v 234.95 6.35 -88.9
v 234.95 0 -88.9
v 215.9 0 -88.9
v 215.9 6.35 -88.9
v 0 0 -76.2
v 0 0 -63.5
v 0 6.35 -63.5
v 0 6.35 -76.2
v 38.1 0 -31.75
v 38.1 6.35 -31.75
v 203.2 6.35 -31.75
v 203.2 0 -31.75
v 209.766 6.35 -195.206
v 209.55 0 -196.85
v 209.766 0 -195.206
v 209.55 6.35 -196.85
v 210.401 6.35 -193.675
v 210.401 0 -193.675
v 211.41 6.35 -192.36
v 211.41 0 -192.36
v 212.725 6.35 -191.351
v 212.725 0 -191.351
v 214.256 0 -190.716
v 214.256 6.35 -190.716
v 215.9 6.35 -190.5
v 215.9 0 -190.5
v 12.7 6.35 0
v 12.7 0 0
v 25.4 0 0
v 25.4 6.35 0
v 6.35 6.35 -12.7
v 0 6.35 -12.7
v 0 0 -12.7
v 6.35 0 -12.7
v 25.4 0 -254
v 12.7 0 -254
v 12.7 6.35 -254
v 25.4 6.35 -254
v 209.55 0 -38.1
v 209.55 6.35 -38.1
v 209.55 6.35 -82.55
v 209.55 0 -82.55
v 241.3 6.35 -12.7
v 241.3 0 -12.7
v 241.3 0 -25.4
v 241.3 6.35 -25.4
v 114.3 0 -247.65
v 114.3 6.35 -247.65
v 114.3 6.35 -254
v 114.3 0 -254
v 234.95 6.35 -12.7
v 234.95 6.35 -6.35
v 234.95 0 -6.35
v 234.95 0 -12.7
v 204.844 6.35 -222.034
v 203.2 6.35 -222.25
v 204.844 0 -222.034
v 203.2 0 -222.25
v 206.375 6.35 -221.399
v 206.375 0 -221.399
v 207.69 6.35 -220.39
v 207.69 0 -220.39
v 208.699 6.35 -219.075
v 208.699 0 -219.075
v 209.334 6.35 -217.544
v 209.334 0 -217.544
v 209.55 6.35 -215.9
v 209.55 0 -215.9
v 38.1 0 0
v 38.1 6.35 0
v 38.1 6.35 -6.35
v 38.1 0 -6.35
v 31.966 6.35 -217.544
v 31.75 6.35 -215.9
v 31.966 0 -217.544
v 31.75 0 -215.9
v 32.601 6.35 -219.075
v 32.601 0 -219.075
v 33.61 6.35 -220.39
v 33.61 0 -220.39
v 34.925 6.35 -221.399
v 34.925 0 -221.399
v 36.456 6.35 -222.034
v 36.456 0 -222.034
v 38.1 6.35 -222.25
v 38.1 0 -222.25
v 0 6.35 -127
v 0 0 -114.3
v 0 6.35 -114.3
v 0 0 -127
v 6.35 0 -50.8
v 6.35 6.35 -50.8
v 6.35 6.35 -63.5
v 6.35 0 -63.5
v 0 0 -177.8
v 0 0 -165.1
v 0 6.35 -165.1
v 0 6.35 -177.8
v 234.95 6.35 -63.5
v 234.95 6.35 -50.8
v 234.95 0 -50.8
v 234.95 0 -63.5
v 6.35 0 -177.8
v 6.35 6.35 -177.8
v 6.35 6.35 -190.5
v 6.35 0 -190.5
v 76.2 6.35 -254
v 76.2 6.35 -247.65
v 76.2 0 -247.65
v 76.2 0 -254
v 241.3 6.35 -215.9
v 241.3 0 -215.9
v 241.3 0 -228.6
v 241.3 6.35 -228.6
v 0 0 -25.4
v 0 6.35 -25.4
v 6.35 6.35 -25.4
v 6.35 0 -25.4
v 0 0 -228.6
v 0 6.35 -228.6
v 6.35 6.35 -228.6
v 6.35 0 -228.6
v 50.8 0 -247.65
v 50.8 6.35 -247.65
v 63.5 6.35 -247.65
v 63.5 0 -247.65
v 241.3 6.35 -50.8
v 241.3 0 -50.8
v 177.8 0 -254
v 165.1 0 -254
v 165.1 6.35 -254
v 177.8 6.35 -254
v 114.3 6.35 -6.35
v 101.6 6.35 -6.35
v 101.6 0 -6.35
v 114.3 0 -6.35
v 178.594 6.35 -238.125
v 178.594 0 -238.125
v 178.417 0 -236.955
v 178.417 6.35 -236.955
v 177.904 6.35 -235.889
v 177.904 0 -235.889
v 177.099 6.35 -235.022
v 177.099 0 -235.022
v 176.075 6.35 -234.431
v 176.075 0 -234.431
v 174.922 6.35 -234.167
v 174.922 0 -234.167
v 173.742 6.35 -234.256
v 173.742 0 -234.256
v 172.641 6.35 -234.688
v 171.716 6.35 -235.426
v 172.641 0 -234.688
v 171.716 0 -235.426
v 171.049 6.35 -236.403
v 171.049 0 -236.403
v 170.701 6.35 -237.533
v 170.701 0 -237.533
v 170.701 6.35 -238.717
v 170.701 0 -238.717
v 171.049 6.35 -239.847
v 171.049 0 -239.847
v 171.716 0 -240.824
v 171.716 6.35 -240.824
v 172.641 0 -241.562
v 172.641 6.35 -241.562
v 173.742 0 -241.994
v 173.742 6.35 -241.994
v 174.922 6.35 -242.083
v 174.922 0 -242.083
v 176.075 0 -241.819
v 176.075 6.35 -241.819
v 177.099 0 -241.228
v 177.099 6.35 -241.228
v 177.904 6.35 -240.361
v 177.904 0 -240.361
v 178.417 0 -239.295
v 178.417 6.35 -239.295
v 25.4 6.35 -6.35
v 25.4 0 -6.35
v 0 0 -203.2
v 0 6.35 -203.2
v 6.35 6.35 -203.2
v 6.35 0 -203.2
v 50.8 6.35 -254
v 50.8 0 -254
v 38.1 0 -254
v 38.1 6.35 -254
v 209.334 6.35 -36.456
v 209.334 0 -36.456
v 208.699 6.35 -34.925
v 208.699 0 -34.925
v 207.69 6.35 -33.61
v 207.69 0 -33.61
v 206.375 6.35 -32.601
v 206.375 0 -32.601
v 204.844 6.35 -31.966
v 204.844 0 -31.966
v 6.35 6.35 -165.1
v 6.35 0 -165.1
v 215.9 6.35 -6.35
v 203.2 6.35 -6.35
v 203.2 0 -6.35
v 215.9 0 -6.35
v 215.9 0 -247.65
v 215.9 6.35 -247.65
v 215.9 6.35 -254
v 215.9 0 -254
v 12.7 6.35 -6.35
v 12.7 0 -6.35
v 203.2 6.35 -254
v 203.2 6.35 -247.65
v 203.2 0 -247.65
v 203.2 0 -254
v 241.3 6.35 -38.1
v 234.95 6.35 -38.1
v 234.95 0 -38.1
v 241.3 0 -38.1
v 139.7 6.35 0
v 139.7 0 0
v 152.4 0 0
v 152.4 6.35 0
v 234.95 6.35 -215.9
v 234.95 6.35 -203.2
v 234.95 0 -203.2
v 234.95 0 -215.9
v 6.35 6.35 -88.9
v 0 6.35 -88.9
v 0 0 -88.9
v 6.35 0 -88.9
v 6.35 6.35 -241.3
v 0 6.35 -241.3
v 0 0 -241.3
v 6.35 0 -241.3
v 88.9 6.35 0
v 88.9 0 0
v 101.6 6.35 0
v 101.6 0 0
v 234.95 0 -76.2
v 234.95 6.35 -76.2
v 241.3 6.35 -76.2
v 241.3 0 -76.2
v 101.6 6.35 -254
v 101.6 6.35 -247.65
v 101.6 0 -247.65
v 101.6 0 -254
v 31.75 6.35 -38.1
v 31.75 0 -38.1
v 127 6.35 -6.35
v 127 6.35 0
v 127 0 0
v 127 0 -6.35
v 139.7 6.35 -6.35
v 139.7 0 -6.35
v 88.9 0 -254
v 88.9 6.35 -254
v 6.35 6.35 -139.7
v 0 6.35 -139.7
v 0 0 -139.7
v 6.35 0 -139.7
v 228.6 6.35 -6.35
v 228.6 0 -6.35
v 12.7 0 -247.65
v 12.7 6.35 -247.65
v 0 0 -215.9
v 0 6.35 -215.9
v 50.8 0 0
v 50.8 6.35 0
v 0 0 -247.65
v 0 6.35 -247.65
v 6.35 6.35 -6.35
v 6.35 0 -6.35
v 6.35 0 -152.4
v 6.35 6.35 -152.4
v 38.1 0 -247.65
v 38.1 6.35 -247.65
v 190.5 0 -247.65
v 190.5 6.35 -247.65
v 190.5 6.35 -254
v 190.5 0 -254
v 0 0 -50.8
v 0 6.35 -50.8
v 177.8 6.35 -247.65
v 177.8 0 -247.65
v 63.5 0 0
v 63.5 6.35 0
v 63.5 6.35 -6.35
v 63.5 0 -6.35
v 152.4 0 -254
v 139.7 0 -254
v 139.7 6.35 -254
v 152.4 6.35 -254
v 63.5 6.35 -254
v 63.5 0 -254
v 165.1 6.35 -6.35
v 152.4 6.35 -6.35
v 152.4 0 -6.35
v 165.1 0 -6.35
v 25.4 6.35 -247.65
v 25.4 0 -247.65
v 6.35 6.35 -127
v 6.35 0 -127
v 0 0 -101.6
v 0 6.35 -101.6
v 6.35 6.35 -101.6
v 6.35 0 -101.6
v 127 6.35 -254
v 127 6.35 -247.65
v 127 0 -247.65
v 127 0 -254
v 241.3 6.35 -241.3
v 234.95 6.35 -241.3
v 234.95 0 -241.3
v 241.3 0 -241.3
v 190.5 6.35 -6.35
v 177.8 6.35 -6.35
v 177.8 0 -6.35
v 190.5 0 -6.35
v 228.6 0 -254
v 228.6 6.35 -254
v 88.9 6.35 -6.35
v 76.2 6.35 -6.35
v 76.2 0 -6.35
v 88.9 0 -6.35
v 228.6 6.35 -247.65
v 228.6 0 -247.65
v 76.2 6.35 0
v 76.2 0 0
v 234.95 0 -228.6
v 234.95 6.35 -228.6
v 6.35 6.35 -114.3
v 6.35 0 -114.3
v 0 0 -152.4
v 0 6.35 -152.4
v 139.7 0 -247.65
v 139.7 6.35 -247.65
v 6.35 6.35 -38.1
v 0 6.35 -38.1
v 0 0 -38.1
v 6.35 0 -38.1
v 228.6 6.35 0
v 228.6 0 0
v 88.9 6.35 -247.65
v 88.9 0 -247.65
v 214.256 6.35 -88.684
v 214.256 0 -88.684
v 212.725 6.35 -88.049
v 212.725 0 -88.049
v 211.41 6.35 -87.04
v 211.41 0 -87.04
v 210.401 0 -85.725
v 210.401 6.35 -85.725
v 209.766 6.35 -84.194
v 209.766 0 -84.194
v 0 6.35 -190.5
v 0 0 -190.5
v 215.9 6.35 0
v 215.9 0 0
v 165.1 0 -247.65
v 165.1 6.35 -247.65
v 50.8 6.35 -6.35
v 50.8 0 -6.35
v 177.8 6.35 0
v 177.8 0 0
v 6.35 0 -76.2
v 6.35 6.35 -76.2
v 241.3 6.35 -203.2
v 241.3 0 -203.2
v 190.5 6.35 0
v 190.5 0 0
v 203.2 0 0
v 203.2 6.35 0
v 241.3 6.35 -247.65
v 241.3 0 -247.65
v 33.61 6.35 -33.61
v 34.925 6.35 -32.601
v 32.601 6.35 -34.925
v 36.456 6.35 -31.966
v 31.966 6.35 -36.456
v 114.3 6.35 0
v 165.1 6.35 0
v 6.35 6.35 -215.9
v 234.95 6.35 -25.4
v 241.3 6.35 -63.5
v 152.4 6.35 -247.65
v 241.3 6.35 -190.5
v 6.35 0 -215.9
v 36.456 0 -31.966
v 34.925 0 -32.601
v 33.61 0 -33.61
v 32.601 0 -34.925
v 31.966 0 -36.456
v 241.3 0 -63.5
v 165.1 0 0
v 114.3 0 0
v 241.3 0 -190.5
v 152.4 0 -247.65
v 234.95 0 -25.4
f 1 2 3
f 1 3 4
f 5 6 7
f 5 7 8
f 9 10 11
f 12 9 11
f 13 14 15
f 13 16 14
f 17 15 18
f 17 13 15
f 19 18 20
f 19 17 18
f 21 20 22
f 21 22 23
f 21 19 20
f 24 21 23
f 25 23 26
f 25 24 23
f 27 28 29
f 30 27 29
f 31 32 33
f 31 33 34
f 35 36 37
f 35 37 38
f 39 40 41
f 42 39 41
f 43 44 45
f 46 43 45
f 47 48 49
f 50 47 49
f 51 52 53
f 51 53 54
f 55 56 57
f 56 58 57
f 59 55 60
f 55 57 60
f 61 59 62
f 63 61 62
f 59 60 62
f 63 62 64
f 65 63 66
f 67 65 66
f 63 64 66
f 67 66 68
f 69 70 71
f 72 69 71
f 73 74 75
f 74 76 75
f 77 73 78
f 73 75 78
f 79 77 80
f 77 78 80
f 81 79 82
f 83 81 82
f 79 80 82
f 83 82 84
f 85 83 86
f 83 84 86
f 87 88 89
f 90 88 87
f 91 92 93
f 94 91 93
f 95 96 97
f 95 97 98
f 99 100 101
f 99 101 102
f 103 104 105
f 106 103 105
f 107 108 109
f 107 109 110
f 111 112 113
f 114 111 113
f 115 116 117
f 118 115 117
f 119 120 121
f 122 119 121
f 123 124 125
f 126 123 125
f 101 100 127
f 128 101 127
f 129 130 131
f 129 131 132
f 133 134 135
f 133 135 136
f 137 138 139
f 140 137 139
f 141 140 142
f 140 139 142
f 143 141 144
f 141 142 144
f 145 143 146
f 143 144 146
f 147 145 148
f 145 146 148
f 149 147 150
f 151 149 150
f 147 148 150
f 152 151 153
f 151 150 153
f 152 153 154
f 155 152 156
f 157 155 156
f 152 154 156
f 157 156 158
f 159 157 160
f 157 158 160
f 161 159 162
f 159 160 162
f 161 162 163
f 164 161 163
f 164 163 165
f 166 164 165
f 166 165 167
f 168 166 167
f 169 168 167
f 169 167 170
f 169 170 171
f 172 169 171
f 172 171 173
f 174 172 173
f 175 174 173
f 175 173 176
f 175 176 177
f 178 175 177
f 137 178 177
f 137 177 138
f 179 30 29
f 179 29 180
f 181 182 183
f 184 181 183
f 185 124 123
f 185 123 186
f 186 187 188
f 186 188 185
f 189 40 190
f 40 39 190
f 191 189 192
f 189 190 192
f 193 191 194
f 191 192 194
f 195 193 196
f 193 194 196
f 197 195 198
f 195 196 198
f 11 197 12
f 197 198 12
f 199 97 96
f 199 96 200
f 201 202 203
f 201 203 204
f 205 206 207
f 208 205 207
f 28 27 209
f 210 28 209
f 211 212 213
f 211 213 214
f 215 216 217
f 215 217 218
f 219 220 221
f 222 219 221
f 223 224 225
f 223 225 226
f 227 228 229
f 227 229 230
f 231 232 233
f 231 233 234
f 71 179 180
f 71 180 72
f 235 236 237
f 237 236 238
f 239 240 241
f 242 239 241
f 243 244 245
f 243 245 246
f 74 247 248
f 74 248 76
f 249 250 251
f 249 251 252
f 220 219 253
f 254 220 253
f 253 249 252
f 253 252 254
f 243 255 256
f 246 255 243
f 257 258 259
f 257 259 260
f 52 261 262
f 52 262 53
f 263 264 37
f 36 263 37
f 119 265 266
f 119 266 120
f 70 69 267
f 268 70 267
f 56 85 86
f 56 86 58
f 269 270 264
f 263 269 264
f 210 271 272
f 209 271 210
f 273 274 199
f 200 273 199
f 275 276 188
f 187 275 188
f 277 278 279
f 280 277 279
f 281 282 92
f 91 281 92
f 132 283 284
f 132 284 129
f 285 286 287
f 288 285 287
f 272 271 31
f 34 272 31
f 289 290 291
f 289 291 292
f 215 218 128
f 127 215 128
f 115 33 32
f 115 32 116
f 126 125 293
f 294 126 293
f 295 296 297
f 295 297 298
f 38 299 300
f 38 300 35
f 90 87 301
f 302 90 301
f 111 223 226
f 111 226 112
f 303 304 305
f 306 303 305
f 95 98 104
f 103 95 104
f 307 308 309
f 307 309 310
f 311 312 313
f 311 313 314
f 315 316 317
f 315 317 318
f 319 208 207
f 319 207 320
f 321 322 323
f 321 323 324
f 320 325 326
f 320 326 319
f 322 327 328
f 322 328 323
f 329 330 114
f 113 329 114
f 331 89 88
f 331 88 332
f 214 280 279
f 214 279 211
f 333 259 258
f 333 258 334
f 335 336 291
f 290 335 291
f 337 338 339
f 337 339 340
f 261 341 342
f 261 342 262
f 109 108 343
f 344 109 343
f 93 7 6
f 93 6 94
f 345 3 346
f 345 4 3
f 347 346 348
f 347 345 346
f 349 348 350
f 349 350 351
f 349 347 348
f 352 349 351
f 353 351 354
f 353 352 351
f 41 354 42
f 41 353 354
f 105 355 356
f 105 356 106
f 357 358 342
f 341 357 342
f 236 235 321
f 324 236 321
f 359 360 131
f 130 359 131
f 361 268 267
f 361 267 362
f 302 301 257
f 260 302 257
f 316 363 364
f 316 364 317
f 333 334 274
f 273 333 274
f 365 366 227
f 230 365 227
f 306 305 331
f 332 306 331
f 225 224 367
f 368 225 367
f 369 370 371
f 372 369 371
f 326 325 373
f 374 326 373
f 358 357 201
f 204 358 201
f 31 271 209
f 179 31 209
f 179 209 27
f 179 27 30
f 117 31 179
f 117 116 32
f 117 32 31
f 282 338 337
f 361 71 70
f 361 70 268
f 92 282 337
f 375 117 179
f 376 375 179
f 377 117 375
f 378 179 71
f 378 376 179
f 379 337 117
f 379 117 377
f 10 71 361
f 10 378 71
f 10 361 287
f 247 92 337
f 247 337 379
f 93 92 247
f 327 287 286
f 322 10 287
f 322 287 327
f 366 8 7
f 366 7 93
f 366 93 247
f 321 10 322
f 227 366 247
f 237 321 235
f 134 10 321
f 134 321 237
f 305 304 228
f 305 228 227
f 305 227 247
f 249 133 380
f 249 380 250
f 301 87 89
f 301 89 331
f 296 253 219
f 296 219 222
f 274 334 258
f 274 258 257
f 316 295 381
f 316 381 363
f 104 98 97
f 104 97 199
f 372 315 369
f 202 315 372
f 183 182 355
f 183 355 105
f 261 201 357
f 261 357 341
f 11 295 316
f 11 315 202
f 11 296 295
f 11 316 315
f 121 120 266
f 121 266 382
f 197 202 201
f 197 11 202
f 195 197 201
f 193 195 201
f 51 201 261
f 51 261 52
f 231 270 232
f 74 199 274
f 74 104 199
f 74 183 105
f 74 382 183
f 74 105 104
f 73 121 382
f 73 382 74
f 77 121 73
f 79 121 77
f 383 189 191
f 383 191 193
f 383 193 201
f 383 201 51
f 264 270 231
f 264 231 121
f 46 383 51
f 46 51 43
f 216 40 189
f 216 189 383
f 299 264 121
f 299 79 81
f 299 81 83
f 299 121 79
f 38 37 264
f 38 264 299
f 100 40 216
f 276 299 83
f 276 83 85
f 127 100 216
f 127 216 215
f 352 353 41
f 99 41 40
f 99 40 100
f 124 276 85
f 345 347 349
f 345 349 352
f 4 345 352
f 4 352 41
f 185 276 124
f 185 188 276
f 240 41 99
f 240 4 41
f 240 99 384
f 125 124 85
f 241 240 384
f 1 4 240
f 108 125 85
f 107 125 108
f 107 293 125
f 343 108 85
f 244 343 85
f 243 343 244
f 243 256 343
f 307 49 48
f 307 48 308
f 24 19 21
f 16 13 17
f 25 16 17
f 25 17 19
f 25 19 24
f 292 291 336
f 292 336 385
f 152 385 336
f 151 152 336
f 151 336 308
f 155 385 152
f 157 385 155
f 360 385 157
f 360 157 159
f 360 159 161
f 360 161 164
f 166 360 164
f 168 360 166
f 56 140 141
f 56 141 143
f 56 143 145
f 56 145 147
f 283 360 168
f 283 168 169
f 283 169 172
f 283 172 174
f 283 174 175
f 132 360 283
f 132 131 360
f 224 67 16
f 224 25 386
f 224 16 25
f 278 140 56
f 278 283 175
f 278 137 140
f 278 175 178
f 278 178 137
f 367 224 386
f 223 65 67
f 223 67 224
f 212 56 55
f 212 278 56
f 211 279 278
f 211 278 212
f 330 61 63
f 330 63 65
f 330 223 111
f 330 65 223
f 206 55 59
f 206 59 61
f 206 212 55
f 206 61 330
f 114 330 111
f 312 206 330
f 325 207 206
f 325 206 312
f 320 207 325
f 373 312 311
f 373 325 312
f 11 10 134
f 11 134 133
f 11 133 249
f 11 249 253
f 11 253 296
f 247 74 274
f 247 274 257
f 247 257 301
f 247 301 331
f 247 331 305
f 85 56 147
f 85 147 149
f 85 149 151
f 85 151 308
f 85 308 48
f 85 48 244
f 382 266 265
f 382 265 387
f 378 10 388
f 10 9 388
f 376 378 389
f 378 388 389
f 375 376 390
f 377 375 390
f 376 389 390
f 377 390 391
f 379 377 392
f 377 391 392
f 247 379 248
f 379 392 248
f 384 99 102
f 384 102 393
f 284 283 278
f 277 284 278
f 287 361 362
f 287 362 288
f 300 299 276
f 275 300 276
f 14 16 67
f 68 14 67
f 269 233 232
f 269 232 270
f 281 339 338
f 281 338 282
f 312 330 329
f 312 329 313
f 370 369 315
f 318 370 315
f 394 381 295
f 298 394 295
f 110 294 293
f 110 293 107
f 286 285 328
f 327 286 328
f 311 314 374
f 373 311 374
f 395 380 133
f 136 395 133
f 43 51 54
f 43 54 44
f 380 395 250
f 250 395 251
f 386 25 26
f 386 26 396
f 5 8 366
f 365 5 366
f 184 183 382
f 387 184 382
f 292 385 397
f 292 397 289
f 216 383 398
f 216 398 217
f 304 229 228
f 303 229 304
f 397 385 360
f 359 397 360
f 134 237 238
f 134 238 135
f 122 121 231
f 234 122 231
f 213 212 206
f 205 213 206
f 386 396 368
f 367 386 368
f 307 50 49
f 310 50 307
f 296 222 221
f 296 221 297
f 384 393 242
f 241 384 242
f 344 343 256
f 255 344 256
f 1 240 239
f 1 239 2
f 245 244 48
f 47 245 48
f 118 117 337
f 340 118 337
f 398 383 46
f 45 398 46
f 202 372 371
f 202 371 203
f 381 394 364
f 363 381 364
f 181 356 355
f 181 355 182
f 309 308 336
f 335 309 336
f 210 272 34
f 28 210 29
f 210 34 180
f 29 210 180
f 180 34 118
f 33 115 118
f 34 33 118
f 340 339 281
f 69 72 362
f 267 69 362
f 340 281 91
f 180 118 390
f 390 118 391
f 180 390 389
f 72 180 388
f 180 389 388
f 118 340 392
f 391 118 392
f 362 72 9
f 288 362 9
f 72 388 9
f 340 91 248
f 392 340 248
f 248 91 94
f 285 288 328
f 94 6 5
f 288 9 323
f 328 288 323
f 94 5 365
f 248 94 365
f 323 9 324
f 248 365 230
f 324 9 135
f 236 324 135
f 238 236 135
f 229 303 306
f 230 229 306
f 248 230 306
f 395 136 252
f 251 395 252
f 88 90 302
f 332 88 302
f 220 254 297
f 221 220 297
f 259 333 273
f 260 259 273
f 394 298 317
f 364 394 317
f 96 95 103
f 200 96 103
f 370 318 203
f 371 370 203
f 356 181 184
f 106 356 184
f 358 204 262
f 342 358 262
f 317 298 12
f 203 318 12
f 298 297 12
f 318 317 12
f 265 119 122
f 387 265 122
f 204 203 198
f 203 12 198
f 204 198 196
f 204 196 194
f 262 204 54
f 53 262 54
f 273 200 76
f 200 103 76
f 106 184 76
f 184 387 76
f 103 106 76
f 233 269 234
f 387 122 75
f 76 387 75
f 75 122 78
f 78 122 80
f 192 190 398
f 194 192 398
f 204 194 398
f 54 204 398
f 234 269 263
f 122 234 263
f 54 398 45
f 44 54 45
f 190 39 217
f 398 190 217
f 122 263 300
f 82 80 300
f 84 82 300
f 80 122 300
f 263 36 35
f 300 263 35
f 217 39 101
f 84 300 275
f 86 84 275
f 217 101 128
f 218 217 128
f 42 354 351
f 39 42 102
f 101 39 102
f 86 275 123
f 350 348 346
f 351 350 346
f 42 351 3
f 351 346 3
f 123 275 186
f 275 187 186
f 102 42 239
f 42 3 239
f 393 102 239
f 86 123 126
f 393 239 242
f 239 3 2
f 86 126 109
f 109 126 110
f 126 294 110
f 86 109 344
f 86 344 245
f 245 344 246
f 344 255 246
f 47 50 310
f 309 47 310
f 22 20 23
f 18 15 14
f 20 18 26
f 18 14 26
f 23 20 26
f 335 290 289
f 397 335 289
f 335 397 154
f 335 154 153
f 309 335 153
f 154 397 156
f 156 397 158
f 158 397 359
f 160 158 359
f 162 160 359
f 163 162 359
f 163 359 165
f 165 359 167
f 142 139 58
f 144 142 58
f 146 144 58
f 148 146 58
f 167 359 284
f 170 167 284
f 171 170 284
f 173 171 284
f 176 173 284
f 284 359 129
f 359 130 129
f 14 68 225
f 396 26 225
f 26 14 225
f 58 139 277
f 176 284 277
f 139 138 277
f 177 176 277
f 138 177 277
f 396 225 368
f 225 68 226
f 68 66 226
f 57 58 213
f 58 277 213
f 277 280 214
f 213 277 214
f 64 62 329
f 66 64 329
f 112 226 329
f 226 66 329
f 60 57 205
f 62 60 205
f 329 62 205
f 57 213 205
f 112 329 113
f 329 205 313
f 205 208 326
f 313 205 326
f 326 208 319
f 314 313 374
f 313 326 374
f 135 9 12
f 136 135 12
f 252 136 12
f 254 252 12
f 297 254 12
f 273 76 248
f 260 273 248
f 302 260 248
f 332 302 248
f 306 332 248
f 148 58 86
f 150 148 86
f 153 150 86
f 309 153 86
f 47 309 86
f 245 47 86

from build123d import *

# Parameters (mm, degrees)
SKETCH1_W               = 241.3
SKETCH1_H               = 254
BOSS_EXTRUDE1_DEPTH     = 6.35
SKETCH2_W               = 6.35
SKETCH2_H               = 12.7
CUT_EXTRUDE1_DEPTH      = 7.35
LPATTERN1_COUNT         = 10
LPATTERN1_PITCH         = 25.4
SKETCH3_W               = 12.7
SKETCH3_H               = 6.35
CUT_EXTRUDE2_DEPTH      = 7.35
LPATTERN2_COUNT         = 10
LPATTERN2_PITCH         = 25.4
SKETCH4_W               = 177.8
SKETCH4_H               = 190.5
CUT_EXTRUDE3_DEPTH      = 7.35
SKETCH5_W               = 101.6
SKETCH5_H               = 6.35
CUT_EXTRUDE4_DEPTH      = 7.35
CUT_EXTRUDE4_DEPTH_BACK = 76.2
FILLET1_R               = 6.35
SKETCH6_R               = 3.96875
CUT_EXTRUDE5_DEPTH      = 115.3


with BuildPart() as part:
    # Sketch1 → Boss-Extrude1 (new body)
    with BuildSketch(Plane(origin=(0, 0, 0), x_dir=(1, 0, 0), z_dir=(0, 1, 0))):
        with Locations((120.65, 127)):
            Rectangle(SKETCH1_W, SKETCH1_H)
    extrude(amount=BOSS_EXTRUDE1_DEPTH)

    # Sketch2 → Cut-Extrude1 (cut, through all)
    with BuildSketch(Plane(origin=(0, 6.35, 0), x_dir=(1, 0, 0), z_dir=(0, 1, 0))):
        with Locations((3.175, 6.35)):
            Rectangle(SKETCH2_W, SKETCH2_H)
        with Locations((238.125, 6.35)):
            Rectangle(SKETCH2_W, SKETCH2_H)
    cut_extrude1 = extrude(amount=-CUT_EXTRUDE1_DEPTH, mode=Mode.SUBTRACT)

    # LPattern1: Cut-Extrude1 ×10
    with Locations(*[(0, 0, -i * LPATTERN1_PITCH) for i in range(1, LPATTERN1_COUNT)]):
        add(cut_extrude1, mode=Mode.SUBTRACT)

    # Sketch3 → Cut-Extrude2 (cut, through all)
    with BuildSketch(Plane(origin=(0, 6.35, 0), x_dir=(1, 0, 0), z_dir=(0, 1, 0))):
        with Locations((6.35, 3.175)):
            Rectangle(SKETCH3_W, SKETCH3_H)
        with Locations((6.35, 250.825)):
            Rectangle(SKETCH3_W, SKETCH3_H)
    cut_extrude2 = extrude(amount=-CUT_EXTRUDE2_DEPTH, mode=Mode.SUBTRACT)

    # LPattern2: Cut-Extrude2 ×10
    with Locations(*[(i * LPATTERN2_PITCH, 0, 0) for i in range(1, LPATTERN2_COUNT)]):
        add(cut_extrude2, mode=Mode.SUBTRACT)

    # Sketch4 → Cut-Extrude3 (cut, through all)
    with BuildSketch(Plane(origin=(0, 6.35, 0), x_dir=(1, 0, 0), z_dir=(0, 1, 0))):
        with Locations((120.65, 127)):
            Rectangle(SKETCH4_W, SKETCH4_H)
    extrude(amount=-CUT_EXTRUDE3_DEPTH, mode=Mode.SUBTRACT)

    # Sketch5 → Cut-Extrude4 (cut, two sides)
    with BuildSketch(Plane(origin=(234.95, 0, 0), x_dir=(0, 0, -1), z_dir=(1, 0, 0))) as cut_extrude4_sk:
        with Locations((139.7, 3.175)):
            Rectangle(SKETCH5_W, SKETCH5_H)
    extrude(amount=CUT_EXTRUDE4_DEPTH, mode=Mode.SUBTRACT)
    extrude(cut_extrude4_sk.sketch, amount=-CUT_EXTRUDE4_DEPTH_BACK, mode=Mode.SUBTRACT)

    # Fillet1
    fillet1_edges = [part.edges().sort_by_distance(p)[0] for p in [
        (31.75, 3.175, -31.75),
        (31.75, 3.175, -222.25),
        (209.55, 3.175, -222.25),
        (209.55, 3.175, -31.75),
        (209.55, 3.175, -88.9),
        (209.55, 3.175, -190.5),
    ]]
    fillet(fillet1_edges, radius=FILLET1_R)

    # Sketch6 → Cut-Extrude5 (cut, through all)
    with BuildSketch(Plane.XZ.offset(107.95)):
        with Locations((174.625, -238.125)):
            Circle(SKETCH6_R)
    extrude(amount=-CUT_EXTRUDE5_DEPTH, mode=Mode.SUBTRACT)


solid = part.part
